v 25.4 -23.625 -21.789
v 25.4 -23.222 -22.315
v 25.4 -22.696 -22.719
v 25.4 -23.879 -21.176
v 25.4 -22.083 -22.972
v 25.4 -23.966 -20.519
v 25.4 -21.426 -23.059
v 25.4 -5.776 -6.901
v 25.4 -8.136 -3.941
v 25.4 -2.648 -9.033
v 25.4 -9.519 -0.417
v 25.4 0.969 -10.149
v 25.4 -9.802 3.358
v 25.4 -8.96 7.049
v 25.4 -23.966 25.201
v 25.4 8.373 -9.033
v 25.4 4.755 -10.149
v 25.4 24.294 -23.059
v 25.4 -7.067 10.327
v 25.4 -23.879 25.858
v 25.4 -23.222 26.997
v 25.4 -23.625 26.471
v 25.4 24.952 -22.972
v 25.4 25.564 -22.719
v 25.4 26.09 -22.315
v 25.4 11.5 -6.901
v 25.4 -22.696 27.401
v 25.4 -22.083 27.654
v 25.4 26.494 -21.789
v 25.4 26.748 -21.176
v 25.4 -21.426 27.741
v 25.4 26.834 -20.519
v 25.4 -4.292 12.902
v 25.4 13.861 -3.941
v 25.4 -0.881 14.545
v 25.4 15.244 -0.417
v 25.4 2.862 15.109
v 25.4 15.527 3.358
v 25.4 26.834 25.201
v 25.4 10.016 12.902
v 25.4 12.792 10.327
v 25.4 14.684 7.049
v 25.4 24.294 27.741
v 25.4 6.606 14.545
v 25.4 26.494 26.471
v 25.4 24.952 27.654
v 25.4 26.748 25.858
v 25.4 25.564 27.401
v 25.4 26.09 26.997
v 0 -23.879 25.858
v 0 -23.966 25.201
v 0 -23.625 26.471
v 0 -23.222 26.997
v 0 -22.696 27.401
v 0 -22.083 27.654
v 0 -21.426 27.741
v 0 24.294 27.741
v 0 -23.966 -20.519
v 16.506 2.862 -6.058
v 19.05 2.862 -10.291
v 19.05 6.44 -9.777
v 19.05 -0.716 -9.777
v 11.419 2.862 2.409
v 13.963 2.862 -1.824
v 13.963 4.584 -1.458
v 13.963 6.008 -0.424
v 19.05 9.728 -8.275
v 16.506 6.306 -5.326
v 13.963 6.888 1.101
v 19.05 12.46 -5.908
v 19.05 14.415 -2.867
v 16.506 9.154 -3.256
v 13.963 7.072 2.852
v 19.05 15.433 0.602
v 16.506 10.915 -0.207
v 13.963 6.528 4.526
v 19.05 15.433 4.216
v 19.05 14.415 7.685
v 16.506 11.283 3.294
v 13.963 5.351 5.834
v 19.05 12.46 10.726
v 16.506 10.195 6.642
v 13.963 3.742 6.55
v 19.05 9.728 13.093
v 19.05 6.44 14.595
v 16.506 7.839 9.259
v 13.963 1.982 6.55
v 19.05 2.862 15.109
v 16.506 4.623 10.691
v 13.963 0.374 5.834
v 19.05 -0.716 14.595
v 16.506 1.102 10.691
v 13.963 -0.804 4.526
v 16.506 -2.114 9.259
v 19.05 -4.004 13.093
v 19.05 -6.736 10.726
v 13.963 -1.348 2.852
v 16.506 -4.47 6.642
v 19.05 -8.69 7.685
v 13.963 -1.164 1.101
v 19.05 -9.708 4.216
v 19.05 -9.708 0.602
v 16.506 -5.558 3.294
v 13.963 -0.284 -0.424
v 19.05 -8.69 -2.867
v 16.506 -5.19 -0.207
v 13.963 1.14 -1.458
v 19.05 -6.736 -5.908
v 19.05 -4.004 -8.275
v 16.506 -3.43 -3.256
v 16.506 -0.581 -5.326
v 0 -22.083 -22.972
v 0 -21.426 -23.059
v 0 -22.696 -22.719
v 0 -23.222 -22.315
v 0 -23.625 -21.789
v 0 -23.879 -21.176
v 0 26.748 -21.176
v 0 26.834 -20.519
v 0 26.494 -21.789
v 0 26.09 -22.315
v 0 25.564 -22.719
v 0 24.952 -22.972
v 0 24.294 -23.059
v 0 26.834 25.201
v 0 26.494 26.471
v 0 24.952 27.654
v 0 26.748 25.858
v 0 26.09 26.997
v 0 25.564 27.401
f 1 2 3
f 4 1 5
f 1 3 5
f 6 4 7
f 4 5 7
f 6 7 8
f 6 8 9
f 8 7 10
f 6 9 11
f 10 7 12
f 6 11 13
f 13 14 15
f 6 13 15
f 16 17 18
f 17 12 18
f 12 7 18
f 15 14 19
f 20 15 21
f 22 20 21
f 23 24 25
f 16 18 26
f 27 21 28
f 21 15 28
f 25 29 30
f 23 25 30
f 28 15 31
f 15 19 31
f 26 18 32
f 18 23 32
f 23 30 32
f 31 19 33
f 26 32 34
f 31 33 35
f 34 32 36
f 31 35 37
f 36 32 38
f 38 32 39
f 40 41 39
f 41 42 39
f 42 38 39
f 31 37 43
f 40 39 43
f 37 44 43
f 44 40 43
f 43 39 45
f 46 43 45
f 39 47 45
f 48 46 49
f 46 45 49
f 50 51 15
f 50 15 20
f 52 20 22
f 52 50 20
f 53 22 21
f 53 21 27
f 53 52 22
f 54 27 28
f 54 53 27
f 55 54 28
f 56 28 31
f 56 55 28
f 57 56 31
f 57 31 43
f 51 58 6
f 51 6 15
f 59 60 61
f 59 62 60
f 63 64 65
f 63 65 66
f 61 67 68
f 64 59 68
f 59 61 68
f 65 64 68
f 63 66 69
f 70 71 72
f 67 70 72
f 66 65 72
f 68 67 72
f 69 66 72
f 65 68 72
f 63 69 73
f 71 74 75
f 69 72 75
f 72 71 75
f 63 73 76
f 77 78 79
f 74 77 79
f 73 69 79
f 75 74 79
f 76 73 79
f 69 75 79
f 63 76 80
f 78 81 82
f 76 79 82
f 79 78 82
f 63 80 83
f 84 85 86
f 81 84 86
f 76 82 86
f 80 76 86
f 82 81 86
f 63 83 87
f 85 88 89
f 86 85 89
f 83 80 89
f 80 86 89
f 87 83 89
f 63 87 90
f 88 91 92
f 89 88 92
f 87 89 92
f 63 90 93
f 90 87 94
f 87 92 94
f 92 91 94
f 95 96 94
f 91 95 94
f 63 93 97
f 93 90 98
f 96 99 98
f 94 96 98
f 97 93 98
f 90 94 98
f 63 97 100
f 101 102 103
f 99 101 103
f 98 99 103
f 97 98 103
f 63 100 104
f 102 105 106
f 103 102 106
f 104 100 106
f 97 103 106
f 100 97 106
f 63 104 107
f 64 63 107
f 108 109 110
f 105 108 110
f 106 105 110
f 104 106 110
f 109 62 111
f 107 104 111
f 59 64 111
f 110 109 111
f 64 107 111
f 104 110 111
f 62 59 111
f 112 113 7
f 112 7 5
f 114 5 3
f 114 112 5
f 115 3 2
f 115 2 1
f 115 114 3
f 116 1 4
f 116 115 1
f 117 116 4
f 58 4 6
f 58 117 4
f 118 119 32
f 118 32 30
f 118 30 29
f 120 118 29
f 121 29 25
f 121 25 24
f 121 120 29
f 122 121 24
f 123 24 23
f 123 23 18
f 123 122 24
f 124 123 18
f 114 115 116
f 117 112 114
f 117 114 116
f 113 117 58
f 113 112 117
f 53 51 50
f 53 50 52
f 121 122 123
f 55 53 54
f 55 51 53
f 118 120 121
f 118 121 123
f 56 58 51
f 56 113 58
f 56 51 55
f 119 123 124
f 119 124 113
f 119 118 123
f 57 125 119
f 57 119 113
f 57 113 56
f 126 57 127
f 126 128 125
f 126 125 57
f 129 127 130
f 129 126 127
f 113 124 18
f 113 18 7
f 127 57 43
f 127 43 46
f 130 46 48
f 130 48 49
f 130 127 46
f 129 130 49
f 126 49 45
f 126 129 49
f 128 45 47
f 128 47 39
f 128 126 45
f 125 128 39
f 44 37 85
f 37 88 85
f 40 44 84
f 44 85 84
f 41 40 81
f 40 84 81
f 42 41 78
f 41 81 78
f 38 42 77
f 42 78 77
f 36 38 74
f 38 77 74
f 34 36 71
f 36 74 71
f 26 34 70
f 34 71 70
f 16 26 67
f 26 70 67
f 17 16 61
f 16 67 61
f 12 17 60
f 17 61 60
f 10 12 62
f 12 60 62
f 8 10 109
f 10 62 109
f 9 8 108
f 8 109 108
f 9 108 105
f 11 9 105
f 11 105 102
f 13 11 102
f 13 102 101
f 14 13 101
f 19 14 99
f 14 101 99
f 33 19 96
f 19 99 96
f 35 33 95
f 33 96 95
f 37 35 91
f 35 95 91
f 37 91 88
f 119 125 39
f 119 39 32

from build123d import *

# Parameters (mm, degrees)
BOSS_EXTRUDE1_DEPTH          = 25.4
F_1_1_0000_DOWEL_HOLE1_D     = 25.4
F_1_1_0000_DOWEL_HOLE1_DEPTH = 6.35
F_1_1_0000_DOWEL_HOLE1_TIP   = 7.630929862


with BuildPart() as part:
    # Sketch2 → Boss-Extrude1 (new body)
    with BuildSketch(Plane(origin=(0, 0, 0), x_dir=(0, 0, -1), z_dir=(1, 0, 0))):
        with BuildLine():
            Line((-25.20103811, 26.834337713), (20.51896189, 26.834337713))
            ThreePointArc((20.51896189, 26.834337713), (22.315013114, 26.090388938), (23.05896189, 24.294337713))
            Line((23.05896189, 24.294337713), (23.05896189, -21.425662287))
            ThreePointArc((23.05896189, -21.425662287), (22.315013114, -23.221713511), (20.51896189, -23.965662287))
            Line((20.51896189, -23.965662287), (-25.20103811, -23.965662287))
            ThreePointArc((-25.20103811, -23.965662287), (-26.997089334, -23.221713511), (-27.74103811, -21.425662287))
            Line((-27.74103811, -21.425662287), (-27.74103811, 24.294337713))
            ThreePointArc((-27.74103811, 24.294337713), (-26.997089334, 26.090388938), (-25.20103811, 26.834337713))
        make_face()
    extrude(amount=BOSS_EXTRUDE1_DEPTH)

    # 1 (1.0000) Dowel Hole1
    with Locations(Plane(origin=(25.4, 0, 0), x_dir=(0, 0, -1), z_dir=(1, 0, 0))):
        with Locations((-2.40903604, 2.862294249)):
            Hole(F_1_1_0000_DOWEL_HOLE1_D / 2, depth=F_1_1_0000_DOWEL_HOLE1_DEPTH)
            with Locations((0, 0, -(F_1_1_0000_DOWEL_HOLE1_DEPTH + F_1_1_0000_DOWEL_HOLE1_TIP / 2))):  # 118° drill point
                Cone(0, F_1_1_0000_DOWEL_HOLE1_D / 2, F_1_1_0000_DOWEL_HOLE1_TIP, mode=Mode.SUBTRACT)


solid = part.part
